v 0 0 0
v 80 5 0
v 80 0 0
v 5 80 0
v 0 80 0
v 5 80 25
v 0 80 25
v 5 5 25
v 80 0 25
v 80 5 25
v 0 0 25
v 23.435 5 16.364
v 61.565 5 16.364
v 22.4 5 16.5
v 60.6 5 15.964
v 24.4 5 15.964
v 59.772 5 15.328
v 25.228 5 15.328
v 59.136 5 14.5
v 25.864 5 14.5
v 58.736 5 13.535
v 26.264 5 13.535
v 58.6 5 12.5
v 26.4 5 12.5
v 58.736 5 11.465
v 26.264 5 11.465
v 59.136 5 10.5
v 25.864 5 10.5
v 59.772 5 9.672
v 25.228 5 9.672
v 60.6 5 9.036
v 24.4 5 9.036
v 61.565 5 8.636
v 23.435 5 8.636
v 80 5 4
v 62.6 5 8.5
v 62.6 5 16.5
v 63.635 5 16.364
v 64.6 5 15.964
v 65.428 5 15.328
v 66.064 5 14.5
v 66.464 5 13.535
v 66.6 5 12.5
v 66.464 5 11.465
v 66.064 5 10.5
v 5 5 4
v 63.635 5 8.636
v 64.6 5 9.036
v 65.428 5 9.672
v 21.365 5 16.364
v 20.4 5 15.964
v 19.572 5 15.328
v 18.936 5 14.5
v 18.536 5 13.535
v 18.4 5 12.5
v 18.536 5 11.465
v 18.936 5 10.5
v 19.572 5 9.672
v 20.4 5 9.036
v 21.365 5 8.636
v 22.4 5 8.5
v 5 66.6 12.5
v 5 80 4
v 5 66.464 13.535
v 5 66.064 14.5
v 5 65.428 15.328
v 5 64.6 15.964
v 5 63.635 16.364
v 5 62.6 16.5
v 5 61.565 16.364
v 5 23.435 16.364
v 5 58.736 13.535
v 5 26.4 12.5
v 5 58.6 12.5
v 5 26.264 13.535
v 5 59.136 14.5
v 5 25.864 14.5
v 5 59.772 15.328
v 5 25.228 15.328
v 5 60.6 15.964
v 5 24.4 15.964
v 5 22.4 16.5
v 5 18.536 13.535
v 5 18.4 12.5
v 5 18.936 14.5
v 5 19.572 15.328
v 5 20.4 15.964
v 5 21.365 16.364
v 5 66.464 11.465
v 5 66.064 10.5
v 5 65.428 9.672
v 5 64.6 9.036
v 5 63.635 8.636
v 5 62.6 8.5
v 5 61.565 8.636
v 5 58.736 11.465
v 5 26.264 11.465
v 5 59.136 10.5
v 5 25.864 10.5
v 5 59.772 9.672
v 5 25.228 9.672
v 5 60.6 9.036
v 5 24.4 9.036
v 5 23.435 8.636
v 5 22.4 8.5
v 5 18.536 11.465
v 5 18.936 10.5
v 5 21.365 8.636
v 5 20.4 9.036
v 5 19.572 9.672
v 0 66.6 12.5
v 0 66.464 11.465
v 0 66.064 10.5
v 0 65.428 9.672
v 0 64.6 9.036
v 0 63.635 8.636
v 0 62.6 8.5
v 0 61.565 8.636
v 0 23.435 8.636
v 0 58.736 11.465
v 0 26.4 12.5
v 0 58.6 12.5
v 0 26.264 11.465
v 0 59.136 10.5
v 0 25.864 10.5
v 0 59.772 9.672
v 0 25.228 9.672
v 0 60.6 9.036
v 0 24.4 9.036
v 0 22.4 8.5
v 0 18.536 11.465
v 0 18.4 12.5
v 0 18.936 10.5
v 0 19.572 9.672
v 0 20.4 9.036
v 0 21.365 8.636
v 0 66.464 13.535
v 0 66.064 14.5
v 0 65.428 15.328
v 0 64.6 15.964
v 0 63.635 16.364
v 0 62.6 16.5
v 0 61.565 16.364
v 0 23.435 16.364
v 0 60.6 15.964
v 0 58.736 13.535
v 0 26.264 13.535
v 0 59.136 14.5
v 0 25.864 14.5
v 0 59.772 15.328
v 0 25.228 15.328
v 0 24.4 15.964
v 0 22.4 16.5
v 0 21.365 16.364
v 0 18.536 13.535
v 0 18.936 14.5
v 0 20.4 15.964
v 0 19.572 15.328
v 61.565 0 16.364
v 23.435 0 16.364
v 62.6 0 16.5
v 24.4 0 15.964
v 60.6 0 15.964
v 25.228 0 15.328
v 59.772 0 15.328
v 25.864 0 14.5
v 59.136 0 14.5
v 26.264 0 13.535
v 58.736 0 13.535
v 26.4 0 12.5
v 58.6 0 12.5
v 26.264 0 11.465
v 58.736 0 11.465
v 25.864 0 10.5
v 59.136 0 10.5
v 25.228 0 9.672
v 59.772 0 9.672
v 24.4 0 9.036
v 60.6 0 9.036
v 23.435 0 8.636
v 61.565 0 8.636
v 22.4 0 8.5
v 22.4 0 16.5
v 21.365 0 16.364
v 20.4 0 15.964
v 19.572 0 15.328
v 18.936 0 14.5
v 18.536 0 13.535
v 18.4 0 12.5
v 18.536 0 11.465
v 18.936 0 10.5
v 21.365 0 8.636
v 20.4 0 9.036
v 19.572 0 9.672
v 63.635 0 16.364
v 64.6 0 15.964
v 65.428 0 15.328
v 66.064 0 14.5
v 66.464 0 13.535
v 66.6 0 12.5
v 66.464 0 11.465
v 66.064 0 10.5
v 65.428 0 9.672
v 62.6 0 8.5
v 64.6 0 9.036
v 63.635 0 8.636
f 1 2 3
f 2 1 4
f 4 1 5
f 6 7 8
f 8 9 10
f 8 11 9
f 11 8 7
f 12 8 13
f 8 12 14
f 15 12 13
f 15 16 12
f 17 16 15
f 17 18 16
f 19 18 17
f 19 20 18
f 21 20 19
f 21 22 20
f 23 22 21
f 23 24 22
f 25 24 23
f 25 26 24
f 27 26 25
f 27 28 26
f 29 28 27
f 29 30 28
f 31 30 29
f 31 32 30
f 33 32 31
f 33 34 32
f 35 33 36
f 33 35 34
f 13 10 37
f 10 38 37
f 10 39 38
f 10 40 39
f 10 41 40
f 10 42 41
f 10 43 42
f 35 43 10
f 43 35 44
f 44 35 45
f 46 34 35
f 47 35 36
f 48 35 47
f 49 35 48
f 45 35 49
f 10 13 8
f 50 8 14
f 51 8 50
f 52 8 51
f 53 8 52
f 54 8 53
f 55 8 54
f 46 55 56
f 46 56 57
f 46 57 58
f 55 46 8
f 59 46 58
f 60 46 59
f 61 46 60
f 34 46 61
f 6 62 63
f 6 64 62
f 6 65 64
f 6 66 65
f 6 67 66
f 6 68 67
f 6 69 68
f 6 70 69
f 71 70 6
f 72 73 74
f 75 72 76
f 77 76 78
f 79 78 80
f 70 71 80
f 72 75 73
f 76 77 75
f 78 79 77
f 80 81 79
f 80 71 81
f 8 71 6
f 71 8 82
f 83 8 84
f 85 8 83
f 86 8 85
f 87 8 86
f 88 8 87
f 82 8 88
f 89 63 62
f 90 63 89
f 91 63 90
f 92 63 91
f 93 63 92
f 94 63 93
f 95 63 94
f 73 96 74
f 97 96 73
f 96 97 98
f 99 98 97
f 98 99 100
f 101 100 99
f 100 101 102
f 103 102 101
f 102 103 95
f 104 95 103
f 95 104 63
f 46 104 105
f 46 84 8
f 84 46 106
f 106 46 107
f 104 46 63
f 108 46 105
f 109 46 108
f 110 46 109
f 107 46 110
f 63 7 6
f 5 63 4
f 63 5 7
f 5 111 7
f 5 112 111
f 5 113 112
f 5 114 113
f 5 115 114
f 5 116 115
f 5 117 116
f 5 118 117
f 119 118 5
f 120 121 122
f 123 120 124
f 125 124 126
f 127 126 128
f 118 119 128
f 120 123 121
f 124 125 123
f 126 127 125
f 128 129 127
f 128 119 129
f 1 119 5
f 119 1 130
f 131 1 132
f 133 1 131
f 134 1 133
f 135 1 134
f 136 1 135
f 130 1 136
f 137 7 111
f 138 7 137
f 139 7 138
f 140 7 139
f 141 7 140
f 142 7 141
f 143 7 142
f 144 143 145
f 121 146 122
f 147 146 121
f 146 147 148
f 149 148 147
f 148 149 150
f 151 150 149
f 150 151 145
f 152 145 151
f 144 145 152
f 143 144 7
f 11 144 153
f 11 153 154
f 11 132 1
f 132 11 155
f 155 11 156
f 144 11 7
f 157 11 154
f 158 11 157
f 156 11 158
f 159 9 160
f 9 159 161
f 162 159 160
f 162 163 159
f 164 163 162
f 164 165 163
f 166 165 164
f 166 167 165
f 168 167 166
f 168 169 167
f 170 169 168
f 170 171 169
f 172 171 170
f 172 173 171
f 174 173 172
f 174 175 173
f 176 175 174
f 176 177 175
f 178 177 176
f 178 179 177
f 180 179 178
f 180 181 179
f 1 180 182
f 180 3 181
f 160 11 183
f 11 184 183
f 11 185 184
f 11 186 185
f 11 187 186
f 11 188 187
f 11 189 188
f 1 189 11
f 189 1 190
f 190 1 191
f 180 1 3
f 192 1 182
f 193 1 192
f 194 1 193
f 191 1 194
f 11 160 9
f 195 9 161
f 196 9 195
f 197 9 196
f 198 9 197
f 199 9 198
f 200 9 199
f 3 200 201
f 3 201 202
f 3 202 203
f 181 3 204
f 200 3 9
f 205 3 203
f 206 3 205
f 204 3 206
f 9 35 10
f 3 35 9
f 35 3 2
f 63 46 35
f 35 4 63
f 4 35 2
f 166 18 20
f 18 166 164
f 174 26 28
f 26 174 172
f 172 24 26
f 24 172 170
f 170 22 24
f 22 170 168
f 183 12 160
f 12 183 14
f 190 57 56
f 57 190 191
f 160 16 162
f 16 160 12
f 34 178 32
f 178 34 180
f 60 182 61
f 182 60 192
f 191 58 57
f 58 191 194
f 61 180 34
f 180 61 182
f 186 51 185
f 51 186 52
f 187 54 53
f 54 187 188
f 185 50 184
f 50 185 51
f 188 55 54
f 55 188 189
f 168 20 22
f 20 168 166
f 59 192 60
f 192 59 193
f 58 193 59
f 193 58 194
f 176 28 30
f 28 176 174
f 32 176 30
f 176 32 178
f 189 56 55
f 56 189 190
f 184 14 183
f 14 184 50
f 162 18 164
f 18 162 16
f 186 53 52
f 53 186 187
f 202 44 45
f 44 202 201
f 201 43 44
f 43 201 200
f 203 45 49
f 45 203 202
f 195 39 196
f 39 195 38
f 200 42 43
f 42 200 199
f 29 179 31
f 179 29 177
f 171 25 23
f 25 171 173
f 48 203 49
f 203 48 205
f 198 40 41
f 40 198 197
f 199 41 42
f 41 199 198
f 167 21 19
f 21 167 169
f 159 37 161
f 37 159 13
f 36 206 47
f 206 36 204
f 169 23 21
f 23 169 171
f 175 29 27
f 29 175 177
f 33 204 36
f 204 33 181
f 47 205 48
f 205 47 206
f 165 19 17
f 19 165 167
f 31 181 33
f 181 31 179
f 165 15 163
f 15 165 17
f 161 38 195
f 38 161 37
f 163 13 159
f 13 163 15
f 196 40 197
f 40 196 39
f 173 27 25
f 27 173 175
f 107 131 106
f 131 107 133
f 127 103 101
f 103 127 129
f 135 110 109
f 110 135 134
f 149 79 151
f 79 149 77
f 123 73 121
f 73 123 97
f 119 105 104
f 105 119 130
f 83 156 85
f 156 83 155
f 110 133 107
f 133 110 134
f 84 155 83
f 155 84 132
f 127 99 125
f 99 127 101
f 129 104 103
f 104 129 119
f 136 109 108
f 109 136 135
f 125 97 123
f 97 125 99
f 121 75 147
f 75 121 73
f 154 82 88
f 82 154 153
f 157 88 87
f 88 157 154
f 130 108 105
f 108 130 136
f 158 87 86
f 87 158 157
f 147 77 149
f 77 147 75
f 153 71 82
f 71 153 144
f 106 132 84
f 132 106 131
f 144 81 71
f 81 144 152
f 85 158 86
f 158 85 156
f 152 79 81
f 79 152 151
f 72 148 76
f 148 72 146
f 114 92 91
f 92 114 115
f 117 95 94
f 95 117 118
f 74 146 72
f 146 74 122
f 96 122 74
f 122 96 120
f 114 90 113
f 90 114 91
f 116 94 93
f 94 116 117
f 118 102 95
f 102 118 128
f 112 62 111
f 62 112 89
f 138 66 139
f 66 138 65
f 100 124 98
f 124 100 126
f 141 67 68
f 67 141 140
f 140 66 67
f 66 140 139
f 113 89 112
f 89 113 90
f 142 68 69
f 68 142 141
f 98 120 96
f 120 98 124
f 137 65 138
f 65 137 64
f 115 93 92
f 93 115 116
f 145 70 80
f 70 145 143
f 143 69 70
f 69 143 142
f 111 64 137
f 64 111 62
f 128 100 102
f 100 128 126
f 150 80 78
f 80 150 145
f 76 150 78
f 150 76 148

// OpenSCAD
// preview[view:north east, tilt:top diagonal]

/* [Dimensions] */

span = 80;

bracket_thickness = 5;

bracket_width = 25;

// Brace thickness is limited to prevent obstructing holes.
brace_thickness = 4;

// You may want to re-orient the model before printing if you change which braces are enabled.
top_brace = 0; // [0:Off, 1:On]

bottom_brace = 1; // [0:Off, 1:On]

hole_diameter = 8;

// Position  as a percentage of distance from corner to edge.
inner_hole_position = 20; // [0:100]

// Position as a percentage of distance from corner to edge.
outer_hole_position = 80; // [0:100]

// Select Inner Face to center holes in space available above/between braces.
hole_centering = 0; // [0:Outer Face, 1:Inner Face]

/* [Hidden] */

hole_radius = hole_diameter / 2;
get_bracket_width = max(bracket_width, hole_diameter);
get_brace_thickness = min(brace_thickness, bracket_width/2 - hole_radius);
get_inner_hole_spacing = inner_hole_position / 100;
get_outer_hole_spacing = outer_hole_position / 100;
hole_height = (hole_centering == 0 ? bracket_width/2 :  (bracket_width - (top_brace * get_brace_thickness) - (bottom_brace * get_brace_thickness))/2 + (bottom_brace * get_brace_thickness));

// Bracket points form an "L" shape; [0, 0] is the outer corner of the bracket.
module bracket() {
	linear_extrude(height=get_bracket_width)
		polygon(points=[[0, 0], [span, 0], [span, bracket_thickness], [bracket_thickness, bracket_thickness], [bracket_thickness, span], [0, span]]);
}	

// Brace points form a triangle; [bracket_thickness, bracket_thickness] is the inner corner of the bracket.
module brace() {
	linear_extrude(height=get_brace_thickness)
		polygon(points=[[bracket_thickness, bracket_thickness], [span, bracket_thickness], [bracket_thickness, span]]);
}

module hole() {
	cylinder(h = bracket_thickness + 2, r = hole_radius, $fn = 24);
}

module left_hole(spacing) {
	translate([bracket_thickness + hole_radius + (spacing * (span - bracket_thickness - hole_diameter)), -1, hole_height])
		rotate([-90, 0, 0])
			hole();
}

module top_hole(spacing) {
	translate([-1, bracket_thickness + hole_radius + (spacing * (span - bracket_thickness - hole_diameter)), hole_height])
		rotate([0, 90, 0])
			hole();
}


difference() {
	union() {
		bracket();		

		if (bottom_brace == 1) {
			brace();
		}

		if (top_brace == 1) {
			translate([0, 0, get_bracket_width - get_brace_thickness]) brace();
		}
	}

	left_hole(get_inner_hole_spacing);
	left_hole(get_outer_hole_spacing);

	top_hole(get_inner_hole_spacing);
	top_hole(get_outer_hole_spacing);
}
